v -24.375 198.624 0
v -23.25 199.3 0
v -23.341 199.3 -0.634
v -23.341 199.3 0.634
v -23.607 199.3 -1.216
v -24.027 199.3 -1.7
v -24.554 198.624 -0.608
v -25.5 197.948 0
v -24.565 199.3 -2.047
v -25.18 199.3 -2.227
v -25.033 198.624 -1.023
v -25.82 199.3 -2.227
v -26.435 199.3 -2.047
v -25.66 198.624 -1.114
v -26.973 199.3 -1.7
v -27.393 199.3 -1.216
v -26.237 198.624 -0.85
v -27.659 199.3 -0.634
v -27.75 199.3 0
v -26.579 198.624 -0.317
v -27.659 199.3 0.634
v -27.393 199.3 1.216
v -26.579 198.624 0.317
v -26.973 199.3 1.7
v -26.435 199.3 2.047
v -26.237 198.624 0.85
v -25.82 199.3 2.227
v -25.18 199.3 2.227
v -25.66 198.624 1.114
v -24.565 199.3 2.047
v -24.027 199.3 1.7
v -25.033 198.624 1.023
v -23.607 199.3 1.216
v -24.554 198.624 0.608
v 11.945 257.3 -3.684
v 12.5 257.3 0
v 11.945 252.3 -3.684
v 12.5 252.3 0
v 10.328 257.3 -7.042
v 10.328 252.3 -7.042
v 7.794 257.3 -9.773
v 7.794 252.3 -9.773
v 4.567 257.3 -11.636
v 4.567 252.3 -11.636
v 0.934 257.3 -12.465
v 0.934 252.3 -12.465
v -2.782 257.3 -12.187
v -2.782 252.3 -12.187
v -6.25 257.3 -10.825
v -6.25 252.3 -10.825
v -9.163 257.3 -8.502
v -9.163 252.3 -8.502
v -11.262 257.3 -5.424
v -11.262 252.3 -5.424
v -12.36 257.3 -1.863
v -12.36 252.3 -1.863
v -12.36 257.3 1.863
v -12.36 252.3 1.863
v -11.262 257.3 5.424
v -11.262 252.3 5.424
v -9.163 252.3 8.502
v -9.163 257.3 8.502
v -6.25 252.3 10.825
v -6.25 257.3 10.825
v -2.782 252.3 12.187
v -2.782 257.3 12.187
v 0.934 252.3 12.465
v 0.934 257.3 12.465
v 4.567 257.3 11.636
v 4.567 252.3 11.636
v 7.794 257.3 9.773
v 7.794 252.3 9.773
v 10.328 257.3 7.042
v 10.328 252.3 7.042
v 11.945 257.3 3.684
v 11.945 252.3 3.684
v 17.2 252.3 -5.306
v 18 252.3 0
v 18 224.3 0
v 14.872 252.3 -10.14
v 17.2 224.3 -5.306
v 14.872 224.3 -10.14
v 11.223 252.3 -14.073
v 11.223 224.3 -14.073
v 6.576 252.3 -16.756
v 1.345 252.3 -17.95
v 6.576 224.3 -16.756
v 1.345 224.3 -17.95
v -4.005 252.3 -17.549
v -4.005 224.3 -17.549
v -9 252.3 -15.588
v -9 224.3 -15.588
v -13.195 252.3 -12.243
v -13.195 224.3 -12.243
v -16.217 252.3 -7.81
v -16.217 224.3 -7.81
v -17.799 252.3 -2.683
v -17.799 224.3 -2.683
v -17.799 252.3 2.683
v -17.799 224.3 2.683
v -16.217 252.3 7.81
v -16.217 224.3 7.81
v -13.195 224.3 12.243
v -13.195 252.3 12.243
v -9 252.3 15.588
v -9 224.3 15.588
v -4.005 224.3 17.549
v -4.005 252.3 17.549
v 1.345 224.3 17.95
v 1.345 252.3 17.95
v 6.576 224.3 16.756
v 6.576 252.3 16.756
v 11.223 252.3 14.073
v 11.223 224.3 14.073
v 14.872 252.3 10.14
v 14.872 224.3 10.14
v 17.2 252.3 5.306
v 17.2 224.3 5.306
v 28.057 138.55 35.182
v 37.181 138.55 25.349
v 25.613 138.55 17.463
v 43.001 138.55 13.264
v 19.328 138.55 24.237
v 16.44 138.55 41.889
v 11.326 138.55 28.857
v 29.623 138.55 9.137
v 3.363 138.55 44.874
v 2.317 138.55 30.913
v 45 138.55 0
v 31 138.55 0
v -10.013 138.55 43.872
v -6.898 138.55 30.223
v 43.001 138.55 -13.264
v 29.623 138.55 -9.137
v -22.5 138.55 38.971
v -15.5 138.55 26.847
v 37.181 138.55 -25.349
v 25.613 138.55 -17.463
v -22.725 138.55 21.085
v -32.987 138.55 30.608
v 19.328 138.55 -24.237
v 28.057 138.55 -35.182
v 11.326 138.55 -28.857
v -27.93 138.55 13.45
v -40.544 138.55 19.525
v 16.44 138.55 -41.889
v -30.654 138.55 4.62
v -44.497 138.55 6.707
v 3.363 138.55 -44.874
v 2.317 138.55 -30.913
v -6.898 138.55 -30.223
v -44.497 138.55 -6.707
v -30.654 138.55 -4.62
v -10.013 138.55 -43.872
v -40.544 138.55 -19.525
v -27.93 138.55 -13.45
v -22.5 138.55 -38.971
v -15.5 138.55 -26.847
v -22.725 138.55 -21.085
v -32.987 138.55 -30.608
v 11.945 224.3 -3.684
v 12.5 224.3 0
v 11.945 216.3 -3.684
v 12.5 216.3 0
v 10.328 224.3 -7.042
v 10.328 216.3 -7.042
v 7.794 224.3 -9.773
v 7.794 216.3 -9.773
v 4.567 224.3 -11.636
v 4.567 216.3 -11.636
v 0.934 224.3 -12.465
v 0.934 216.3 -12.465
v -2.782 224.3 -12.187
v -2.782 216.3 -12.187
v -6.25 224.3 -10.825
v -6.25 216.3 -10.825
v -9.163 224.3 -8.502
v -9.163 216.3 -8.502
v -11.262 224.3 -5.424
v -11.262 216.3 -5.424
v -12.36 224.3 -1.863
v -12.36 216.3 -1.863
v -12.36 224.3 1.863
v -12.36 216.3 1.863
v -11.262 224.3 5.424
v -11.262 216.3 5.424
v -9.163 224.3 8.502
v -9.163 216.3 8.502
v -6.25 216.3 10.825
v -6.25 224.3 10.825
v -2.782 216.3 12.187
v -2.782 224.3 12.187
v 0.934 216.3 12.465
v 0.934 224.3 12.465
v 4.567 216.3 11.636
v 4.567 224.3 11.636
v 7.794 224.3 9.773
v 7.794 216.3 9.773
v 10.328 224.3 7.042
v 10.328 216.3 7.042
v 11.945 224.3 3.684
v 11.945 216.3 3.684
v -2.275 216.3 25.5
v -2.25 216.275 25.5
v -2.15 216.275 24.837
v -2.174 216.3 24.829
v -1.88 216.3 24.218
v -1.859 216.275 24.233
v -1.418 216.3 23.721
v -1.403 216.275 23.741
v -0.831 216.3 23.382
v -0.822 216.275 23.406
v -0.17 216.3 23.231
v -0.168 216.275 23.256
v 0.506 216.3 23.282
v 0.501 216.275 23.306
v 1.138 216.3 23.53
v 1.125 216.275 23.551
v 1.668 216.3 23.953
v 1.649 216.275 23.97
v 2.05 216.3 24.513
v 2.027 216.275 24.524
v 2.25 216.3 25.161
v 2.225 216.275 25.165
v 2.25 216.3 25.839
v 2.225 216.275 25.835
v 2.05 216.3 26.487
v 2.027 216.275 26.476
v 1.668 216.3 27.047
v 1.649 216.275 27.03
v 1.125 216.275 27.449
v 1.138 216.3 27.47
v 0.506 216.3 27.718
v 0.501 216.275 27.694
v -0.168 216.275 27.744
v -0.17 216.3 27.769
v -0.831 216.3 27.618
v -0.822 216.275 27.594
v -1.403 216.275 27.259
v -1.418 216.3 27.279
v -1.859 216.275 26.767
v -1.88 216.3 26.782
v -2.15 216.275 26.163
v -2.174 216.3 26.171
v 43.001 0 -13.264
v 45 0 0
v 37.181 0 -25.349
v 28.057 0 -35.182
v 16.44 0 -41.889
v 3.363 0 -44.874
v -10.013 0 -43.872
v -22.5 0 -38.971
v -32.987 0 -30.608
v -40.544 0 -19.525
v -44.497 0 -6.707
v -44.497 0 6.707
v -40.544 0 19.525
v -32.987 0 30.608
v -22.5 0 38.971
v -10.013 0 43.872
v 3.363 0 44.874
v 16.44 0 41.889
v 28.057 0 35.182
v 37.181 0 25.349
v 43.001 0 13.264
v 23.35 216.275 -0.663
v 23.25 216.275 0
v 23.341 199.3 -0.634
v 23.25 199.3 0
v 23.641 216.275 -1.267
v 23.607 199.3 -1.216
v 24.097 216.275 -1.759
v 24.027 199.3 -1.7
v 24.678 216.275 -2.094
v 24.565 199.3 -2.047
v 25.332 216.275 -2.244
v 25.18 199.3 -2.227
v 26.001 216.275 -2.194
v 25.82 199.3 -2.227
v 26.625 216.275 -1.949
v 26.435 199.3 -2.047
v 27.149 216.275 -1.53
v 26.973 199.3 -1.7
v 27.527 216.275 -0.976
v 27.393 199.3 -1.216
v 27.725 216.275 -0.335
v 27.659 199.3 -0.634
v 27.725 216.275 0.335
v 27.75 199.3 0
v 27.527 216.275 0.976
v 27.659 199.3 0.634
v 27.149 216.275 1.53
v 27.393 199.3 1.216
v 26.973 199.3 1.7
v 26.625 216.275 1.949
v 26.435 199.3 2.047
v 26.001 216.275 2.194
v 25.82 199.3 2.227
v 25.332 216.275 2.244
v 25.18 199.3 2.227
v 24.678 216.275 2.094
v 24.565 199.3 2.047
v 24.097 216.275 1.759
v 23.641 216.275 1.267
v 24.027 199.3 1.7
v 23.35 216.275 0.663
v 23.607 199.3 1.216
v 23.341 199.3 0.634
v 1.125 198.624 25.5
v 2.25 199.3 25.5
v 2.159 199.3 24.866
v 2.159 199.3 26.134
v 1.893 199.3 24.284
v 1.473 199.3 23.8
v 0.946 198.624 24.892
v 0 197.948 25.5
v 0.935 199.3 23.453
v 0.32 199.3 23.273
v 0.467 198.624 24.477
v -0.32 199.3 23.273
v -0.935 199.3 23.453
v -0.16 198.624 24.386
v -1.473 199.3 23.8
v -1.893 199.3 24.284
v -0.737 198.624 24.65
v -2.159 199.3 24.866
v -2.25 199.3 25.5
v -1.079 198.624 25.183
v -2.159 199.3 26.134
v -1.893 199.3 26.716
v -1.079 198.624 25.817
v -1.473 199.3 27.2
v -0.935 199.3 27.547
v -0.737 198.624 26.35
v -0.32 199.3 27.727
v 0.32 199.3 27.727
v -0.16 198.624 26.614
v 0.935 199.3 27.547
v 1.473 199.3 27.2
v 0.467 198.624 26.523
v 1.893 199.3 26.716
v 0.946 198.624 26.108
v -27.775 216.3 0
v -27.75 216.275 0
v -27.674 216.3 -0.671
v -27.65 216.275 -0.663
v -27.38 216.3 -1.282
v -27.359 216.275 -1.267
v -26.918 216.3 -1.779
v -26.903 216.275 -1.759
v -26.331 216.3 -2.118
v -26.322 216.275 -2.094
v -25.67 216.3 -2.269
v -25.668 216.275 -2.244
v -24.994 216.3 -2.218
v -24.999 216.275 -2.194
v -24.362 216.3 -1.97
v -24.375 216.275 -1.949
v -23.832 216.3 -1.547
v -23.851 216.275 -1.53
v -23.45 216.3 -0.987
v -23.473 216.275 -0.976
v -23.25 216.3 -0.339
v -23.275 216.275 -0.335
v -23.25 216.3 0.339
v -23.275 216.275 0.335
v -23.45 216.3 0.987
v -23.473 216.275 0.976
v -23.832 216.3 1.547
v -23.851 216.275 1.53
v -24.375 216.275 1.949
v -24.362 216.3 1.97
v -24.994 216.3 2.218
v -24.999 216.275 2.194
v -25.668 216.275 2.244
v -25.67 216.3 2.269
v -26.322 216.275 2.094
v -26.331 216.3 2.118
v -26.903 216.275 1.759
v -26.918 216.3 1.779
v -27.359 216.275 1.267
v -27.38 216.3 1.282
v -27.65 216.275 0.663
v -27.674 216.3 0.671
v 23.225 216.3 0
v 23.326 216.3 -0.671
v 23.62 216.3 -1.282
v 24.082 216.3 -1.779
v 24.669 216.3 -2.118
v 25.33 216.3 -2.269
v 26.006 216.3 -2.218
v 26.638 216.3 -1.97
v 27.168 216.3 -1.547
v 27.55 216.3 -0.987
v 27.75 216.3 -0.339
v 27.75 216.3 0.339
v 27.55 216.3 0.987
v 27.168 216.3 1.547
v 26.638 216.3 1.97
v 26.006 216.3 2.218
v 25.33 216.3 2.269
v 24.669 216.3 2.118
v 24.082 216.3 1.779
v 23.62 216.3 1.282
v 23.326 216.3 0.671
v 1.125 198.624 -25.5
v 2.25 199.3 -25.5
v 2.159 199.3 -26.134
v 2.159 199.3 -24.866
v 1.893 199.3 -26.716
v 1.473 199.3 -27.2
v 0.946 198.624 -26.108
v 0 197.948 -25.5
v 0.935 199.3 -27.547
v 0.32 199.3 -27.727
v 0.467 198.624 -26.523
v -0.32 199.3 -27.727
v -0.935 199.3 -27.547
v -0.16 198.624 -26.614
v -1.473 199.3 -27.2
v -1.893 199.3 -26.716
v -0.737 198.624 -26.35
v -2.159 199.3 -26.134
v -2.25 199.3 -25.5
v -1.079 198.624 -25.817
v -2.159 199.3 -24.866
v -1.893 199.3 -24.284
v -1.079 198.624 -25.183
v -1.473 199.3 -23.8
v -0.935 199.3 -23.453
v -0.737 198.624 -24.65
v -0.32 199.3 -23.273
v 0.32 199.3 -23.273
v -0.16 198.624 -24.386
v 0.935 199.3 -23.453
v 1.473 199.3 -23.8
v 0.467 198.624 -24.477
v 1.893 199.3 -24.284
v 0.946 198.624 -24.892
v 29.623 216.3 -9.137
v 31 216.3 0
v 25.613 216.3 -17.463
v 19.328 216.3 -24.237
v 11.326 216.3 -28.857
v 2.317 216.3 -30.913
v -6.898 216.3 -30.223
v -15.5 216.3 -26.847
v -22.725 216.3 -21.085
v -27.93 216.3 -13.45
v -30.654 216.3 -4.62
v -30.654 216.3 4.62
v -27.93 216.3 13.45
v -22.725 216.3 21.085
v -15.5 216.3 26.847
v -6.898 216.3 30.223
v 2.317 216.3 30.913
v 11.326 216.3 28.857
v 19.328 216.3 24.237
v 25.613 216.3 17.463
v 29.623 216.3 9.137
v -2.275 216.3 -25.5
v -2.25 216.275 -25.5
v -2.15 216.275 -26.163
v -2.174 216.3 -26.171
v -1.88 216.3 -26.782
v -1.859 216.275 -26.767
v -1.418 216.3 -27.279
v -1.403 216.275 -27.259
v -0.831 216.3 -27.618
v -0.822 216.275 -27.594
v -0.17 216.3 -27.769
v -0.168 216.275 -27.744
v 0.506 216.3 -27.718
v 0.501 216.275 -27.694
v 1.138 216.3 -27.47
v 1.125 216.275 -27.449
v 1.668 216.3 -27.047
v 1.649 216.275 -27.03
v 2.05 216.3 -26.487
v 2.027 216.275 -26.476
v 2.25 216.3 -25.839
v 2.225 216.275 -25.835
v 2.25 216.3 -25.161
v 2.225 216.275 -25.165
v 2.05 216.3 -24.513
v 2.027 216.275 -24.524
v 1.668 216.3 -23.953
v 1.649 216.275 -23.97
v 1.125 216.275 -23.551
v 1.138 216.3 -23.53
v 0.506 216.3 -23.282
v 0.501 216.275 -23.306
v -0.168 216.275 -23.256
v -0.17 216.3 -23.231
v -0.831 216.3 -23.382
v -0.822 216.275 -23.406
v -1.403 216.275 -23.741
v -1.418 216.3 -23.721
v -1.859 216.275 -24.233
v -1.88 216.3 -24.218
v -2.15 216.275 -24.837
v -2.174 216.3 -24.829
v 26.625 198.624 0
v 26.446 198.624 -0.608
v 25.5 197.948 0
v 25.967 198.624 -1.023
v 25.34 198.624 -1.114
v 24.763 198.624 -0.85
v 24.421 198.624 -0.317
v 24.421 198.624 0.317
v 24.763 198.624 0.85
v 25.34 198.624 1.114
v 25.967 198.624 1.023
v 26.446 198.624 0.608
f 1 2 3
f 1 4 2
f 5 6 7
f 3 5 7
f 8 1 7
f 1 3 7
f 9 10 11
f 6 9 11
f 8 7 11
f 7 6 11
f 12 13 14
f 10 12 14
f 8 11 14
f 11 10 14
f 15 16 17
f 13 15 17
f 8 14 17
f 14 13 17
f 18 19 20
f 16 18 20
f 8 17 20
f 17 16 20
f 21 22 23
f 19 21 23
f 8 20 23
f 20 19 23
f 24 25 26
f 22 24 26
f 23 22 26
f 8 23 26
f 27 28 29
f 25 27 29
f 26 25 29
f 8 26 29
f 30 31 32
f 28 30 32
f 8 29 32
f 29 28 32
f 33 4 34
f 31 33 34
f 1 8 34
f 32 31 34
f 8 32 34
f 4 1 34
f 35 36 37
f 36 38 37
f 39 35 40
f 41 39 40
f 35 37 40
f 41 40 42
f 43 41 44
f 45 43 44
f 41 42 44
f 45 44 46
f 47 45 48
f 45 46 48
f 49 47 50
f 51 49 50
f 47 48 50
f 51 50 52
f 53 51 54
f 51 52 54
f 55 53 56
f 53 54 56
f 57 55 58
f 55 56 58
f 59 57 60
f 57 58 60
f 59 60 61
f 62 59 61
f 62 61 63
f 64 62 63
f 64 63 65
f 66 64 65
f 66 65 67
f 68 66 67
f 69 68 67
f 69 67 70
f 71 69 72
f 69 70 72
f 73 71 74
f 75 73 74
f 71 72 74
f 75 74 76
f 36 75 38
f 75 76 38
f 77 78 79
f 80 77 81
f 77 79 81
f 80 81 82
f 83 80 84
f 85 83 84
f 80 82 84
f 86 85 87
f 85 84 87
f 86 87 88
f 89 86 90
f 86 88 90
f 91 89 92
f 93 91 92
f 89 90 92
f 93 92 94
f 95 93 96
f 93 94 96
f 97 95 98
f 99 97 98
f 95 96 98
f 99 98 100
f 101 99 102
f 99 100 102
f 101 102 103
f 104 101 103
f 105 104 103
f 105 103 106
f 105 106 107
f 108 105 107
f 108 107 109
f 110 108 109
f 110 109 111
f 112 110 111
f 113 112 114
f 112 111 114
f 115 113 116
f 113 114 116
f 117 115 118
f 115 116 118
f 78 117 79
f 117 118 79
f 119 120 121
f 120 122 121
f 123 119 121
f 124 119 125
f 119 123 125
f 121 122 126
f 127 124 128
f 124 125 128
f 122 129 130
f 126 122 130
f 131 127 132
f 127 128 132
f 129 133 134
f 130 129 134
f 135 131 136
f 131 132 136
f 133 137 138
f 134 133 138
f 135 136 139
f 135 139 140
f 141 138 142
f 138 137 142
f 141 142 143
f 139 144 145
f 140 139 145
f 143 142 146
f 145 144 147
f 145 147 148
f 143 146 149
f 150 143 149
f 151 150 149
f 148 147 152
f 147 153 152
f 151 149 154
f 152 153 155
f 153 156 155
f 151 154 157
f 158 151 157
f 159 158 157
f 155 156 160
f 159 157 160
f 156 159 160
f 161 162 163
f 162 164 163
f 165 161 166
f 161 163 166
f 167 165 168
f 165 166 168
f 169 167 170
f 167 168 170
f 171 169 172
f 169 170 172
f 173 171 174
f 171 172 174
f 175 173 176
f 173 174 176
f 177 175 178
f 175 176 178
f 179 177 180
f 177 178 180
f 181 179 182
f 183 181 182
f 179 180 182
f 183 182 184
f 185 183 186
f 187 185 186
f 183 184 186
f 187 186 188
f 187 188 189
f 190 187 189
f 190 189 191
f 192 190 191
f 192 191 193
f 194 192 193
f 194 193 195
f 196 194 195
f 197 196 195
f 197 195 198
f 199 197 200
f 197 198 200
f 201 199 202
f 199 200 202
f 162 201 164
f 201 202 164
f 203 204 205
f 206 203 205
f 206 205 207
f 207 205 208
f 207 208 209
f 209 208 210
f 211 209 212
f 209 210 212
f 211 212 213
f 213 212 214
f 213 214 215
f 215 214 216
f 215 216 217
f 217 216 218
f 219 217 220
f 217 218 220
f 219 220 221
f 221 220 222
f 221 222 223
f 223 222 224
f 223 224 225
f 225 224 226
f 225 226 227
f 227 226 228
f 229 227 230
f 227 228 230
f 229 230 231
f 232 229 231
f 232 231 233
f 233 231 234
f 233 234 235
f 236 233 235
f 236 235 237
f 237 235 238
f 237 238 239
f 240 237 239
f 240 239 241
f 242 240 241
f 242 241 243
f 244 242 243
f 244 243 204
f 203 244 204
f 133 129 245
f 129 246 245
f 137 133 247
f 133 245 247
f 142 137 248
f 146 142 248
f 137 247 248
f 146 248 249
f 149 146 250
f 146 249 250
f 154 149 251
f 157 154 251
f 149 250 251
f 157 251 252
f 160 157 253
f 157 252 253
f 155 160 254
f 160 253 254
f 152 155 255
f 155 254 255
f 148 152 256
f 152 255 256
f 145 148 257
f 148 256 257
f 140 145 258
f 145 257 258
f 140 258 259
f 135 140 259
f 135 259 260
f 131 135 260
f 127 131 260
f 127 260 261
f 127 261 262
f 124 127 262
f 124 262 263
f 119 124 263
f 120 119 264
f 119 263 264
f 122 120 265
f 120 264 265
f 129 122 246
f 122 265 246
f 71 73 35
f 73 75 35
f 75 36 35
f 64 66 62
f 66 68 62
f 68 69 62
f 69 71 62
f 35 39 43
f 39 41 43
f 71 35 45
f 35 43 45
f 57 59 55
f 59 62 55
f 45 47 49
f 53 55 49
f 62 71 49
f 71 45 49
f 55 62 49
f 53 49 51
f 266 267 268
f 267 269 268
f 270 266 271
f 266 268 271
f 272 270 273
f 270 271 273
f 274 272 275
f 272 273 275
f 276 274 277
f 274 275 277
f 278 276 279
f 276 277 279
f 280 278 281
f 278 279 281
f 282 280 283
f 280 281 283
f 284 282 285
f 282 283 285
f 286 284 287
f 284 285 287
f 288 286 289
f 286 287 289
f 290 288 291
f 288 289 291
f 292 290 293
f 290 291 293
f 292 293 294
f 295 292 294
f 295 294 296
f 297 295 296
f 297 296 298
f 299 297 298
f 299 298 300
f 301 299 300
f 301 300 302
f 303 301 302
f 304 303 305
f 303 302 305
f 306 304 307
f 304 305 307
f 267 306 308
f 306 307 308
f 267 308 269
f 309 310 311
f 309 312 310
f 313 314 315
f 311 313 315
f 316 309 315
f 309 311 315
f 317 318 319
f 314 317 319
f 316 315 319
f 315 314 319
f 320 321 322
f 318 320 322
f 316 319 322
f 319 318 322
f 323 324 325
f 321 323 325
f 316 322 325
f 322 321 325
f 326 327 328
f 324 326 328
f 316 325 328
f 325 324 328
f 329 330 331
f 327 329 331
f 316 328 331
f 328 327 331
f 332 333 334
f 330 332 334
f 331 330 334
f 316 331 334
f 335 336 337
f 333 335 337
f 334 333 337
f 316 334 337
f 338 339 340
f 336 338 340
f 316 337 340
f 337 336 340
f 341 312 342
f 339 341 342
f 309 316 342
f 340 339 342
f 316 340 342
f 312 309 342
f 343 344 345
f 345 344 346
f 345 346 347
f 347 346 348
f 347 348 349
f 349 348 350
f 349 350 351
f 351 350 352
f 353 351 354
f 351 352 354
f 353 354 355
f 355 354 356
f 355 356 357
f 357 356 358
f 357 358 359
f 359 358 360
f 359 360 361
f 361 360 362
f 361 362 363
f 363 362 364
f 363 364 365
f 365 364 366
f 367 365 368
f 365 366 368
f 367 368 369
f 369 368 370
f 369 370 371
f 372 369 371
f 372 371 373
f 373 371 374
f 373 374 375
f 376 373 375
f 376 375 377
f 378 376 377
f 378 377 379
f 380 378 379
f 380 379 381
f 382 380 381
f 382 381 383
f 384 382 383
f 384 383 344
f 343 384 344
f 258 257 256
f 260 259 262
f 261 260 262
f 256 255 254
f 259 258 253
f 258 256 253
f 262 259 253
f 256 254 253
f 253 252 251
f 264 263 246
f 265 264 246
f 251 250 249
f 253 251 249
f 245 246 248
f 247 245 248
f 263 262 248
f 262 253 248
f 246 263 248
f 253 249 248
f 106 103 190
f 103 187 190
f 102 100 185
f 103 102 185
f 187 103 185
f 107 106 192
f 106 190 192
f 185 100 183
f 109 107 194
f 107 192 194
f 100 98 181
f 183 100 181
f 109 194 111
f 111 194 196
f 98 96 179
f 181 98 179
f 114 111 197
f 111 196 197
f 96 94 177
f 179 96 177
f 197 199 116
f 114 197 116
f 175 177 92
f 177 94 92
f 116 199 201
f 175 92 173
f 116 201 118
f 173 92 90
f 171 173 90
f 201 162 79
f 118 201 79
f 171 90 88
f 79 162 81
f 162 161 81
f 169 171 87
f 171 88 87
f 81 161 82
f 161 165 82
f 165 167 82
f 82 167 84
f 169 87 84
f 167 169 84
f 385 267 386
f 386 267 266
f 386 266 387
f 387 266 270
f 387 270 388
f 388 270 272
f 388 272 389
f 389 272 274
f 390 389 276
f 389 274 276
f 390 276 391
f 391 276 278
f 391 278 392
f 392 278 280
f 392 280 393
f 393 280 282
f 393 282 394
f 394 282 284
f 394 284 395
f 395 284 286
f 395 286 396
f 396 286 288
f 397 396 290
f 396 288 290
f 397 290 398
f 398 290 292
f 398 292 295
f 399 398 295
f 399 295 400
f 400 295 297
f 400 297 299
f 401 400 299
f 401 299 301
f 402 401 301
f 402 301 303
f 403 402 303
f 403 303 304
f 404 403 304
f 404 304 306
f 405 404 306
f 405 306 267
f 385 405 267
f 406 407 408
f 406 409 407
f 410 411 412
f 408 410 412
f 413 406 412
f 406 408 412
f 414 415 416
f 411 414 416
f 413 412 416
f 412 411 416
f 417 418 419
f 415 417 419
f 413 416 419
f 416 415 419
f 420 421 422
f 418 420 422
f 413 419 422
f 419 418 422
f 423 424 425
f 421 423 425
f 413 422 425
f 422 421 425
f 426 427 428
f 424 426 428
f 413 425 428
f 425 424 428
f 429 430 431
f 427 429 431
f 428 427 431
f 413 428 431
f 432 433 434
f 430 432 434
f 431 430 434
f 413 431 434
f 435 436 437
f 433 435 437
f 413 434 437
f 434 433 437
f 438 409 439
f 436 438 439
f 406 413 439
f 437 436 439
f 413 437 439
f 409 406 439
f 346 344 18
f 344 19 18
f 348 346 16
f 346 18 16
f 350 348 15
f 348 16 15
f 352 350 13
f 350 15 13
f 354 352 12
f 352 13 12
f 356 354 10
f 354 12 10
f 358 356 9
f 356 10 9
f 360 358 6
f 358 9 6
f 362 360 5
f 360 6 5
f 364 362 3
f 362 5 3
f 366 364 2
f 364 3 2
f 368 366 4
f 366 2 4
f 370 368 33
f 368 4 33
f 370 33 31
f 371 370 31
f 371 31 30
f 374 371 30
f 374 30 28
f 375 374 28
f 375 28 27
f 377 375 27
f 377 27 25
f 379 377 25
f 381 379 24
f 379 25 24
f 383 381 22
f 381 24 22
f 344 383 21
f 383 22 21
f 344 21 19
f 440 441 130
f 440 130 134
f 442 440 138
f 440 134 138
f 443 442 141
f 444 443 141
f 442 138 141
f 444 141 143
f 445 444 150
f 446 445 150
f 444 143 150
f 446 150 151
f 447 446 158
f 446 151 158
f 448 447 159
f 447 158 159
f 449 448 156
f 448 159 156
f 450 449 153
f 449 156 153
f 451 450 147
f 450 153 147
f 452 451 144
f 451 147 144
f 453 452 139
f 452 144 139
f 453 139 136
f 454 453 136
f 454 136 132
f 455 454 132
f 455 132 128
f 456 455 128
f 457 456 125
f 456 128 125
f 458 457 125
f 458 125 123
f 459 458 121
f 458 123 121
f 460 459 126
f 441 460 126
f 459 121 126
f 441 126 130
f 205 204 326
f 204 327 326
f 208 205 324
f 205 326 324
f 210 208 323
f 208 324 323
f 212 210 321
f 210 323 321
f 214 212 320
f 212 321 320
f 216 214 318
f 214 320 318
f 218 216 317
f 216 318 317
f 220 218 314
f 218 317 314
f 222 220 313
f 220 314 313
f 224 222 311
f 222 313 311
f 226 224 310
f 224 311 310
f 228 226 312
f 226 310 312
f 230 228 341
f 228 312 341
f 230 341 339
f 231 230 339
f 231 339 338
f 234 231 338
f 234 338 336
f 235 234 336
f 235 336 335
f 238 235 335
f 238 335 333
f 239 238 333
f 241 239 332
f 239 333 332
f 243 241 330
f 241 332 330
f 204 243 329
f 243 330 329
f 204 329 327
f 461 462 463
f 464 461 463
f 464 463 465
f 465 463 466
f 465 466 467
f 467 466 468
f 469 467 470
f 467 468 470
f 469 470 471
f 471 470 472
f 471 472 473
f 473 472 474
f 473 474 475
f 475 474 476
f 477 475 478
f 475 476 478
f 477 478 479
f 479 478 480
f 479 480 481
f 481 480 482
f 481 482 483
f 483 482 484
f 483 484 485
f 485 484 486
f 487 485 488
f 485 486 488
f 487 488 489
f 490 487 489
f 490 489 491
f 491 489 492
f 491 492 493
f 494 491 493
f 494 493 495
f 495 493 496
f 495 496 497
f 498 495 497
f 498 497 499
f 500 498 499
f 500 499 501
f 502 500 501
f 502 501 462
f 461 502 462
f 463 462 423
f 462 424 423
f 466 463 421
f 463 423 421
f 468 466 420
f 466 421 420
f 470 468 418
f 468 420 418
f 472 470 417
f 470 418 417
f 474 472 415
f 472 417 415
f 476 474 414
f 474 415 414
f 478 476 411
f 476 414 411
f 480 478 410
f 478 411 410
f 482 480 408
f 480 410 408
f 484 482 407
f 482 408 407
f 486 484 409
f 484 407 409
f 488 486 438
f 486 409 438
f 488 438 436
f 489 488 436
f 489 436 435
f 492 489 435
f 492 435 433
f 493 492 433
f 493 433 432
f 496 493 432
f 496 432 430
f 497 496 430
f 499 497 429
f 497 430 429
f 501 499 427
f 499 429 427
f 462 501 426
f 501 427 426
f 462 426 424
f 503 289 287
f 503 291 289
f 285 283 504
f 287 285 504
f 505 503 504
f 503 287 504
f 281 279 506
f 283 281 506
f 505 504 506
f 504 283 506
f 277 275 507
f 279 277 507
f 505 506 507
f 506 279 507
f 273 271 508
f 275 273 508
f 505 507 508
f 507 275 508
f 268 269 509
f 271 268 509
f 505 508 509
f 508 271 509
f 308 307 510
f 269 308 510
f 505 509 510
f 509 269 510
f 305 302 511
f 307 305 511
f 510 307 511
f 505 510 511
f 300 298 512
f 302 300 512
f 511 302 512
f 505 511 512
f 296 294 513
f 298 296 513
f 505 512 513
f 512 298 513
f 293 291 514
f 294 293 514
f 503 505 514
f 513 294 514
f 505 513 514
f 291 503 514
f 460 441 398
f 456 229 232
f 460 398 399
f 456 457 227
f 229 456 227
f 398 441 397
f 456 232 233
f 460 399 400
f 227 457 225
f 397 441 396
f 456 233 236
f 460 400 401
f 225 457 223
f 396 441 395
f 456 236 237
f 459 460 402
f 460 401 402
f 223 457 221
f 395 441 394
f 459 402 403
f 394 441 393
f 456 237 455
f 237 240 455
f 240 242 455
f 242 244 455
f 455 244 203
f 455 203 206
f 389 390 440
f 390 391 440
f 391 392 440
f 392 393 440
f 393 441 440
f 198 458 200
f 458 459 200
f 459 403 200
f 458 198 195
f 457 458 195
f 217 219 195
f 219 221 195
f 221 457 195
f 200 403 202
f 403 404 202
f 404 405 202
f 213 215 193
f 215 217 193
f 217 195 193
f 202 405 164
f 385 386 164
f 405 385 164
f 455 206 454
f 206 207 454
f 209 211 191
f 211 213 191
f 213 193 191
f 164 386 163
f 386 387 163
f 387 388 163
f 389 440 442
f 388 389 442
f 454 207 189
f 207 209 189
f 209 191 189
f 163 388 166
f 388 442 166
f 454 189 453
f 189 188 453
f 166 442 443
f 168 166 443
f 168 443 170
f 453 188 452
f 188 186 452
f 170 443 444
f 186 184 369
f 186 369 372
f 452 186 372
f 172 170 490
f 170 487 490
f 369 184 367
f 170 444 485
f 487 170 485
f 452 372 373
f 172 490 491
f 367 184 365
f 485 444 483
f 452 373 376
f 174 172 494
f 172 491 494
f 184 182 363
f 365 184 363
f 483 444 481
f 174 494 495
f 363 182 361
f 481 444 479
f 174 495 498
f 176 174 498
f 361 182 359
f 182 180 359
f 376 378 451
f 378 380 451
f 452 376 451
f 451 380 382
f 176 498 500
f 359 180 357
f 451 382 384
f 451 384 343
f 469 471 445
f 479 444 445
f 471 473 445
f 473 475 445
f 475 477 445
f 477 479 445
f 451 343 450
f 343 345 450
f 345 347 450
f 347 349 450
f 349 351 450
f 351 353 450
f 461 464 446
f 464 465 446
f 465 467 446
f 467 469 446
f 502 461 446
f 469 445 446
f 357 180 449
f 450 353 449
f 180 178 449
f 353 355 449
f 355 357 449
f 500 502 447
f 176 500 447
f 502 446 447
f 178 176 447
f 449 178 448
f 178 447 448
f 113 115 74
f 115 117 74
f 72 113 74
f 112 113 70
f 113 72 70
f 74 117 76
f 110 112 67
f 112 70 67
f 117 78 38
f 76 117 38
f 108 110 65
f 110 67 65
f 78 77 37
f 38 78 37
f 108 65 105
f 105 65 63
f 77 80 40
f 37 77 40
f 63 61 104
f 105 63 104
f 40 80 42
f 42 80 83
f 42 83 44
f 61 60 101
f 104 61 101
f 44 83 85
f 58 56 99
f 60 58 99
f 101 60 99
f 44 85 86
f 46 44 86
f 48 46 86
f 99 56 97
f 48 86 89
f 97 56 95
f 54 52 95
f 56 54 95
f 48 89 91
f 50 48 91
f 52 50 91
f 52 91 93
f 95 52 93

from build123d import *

# Parameters (mm, degrees)
FORO_PER_VITE_M4_1_D           = 4.5
FORO_PER_VITE_M4_1_DEPTH       = 17
FORO_PER_VITE_M4_1_CSINK_D     = 4.55
FORO_PER_VITE_M4_1_CSINK_ANGLE = 90
FORO_PER_VITE_M4_1_TIP         = 1.351936393


with BuildPart() as part:
    # Schizzo2 → Rivoluzione1 (revolve)
    with BuildSketch(Plane.XY):
        Polygon((0, 257.3), (12.5, 257.3), (12.5, 252.3), (18, 252.3), (18, 224.3), (12.5, 224.3), (12.5, 216.3), (31, 216.3), (31, 138.55), (45, 138.55), (45, 0), (0, 0), align=None)
    revolve(axis=Axis((0, -1182.394203663, 0), (0, 1, 0)))

    # Foro per Vite M4-1
    with Locations(Plane(origin=(0, 216.3, 0), x_dir=(1, 0, 0), z_dir=(0, 1, 0))):
        with Locations((0, 25.5), (25.5, 0), (0, -25.5), (-25.5, 0)):
            CounterSinkHole(FORO_PER_VITE_M4_1_D / 2, FORO_PER_VITE_M4_1_CSINK_D / 2, depth=FORO_PER_VITE_M4_1_DEPTH, counter_sink_angle=FORO_PER_VITE_M4_1_CSINK_ANGLE)
            with Locations((0, 0, -(FORO_PER_VITE_M4_1_DEPTH + FORO_PER_VITE_M4_1_TIP / 2))):  # 118° drill point
                Cone(0, FORO_PER_VITE_M4_1_D / 2, FORO_PER_VITE_M4_1_TIP, mode=Mode.SUBTRACT)


solid = part.part
